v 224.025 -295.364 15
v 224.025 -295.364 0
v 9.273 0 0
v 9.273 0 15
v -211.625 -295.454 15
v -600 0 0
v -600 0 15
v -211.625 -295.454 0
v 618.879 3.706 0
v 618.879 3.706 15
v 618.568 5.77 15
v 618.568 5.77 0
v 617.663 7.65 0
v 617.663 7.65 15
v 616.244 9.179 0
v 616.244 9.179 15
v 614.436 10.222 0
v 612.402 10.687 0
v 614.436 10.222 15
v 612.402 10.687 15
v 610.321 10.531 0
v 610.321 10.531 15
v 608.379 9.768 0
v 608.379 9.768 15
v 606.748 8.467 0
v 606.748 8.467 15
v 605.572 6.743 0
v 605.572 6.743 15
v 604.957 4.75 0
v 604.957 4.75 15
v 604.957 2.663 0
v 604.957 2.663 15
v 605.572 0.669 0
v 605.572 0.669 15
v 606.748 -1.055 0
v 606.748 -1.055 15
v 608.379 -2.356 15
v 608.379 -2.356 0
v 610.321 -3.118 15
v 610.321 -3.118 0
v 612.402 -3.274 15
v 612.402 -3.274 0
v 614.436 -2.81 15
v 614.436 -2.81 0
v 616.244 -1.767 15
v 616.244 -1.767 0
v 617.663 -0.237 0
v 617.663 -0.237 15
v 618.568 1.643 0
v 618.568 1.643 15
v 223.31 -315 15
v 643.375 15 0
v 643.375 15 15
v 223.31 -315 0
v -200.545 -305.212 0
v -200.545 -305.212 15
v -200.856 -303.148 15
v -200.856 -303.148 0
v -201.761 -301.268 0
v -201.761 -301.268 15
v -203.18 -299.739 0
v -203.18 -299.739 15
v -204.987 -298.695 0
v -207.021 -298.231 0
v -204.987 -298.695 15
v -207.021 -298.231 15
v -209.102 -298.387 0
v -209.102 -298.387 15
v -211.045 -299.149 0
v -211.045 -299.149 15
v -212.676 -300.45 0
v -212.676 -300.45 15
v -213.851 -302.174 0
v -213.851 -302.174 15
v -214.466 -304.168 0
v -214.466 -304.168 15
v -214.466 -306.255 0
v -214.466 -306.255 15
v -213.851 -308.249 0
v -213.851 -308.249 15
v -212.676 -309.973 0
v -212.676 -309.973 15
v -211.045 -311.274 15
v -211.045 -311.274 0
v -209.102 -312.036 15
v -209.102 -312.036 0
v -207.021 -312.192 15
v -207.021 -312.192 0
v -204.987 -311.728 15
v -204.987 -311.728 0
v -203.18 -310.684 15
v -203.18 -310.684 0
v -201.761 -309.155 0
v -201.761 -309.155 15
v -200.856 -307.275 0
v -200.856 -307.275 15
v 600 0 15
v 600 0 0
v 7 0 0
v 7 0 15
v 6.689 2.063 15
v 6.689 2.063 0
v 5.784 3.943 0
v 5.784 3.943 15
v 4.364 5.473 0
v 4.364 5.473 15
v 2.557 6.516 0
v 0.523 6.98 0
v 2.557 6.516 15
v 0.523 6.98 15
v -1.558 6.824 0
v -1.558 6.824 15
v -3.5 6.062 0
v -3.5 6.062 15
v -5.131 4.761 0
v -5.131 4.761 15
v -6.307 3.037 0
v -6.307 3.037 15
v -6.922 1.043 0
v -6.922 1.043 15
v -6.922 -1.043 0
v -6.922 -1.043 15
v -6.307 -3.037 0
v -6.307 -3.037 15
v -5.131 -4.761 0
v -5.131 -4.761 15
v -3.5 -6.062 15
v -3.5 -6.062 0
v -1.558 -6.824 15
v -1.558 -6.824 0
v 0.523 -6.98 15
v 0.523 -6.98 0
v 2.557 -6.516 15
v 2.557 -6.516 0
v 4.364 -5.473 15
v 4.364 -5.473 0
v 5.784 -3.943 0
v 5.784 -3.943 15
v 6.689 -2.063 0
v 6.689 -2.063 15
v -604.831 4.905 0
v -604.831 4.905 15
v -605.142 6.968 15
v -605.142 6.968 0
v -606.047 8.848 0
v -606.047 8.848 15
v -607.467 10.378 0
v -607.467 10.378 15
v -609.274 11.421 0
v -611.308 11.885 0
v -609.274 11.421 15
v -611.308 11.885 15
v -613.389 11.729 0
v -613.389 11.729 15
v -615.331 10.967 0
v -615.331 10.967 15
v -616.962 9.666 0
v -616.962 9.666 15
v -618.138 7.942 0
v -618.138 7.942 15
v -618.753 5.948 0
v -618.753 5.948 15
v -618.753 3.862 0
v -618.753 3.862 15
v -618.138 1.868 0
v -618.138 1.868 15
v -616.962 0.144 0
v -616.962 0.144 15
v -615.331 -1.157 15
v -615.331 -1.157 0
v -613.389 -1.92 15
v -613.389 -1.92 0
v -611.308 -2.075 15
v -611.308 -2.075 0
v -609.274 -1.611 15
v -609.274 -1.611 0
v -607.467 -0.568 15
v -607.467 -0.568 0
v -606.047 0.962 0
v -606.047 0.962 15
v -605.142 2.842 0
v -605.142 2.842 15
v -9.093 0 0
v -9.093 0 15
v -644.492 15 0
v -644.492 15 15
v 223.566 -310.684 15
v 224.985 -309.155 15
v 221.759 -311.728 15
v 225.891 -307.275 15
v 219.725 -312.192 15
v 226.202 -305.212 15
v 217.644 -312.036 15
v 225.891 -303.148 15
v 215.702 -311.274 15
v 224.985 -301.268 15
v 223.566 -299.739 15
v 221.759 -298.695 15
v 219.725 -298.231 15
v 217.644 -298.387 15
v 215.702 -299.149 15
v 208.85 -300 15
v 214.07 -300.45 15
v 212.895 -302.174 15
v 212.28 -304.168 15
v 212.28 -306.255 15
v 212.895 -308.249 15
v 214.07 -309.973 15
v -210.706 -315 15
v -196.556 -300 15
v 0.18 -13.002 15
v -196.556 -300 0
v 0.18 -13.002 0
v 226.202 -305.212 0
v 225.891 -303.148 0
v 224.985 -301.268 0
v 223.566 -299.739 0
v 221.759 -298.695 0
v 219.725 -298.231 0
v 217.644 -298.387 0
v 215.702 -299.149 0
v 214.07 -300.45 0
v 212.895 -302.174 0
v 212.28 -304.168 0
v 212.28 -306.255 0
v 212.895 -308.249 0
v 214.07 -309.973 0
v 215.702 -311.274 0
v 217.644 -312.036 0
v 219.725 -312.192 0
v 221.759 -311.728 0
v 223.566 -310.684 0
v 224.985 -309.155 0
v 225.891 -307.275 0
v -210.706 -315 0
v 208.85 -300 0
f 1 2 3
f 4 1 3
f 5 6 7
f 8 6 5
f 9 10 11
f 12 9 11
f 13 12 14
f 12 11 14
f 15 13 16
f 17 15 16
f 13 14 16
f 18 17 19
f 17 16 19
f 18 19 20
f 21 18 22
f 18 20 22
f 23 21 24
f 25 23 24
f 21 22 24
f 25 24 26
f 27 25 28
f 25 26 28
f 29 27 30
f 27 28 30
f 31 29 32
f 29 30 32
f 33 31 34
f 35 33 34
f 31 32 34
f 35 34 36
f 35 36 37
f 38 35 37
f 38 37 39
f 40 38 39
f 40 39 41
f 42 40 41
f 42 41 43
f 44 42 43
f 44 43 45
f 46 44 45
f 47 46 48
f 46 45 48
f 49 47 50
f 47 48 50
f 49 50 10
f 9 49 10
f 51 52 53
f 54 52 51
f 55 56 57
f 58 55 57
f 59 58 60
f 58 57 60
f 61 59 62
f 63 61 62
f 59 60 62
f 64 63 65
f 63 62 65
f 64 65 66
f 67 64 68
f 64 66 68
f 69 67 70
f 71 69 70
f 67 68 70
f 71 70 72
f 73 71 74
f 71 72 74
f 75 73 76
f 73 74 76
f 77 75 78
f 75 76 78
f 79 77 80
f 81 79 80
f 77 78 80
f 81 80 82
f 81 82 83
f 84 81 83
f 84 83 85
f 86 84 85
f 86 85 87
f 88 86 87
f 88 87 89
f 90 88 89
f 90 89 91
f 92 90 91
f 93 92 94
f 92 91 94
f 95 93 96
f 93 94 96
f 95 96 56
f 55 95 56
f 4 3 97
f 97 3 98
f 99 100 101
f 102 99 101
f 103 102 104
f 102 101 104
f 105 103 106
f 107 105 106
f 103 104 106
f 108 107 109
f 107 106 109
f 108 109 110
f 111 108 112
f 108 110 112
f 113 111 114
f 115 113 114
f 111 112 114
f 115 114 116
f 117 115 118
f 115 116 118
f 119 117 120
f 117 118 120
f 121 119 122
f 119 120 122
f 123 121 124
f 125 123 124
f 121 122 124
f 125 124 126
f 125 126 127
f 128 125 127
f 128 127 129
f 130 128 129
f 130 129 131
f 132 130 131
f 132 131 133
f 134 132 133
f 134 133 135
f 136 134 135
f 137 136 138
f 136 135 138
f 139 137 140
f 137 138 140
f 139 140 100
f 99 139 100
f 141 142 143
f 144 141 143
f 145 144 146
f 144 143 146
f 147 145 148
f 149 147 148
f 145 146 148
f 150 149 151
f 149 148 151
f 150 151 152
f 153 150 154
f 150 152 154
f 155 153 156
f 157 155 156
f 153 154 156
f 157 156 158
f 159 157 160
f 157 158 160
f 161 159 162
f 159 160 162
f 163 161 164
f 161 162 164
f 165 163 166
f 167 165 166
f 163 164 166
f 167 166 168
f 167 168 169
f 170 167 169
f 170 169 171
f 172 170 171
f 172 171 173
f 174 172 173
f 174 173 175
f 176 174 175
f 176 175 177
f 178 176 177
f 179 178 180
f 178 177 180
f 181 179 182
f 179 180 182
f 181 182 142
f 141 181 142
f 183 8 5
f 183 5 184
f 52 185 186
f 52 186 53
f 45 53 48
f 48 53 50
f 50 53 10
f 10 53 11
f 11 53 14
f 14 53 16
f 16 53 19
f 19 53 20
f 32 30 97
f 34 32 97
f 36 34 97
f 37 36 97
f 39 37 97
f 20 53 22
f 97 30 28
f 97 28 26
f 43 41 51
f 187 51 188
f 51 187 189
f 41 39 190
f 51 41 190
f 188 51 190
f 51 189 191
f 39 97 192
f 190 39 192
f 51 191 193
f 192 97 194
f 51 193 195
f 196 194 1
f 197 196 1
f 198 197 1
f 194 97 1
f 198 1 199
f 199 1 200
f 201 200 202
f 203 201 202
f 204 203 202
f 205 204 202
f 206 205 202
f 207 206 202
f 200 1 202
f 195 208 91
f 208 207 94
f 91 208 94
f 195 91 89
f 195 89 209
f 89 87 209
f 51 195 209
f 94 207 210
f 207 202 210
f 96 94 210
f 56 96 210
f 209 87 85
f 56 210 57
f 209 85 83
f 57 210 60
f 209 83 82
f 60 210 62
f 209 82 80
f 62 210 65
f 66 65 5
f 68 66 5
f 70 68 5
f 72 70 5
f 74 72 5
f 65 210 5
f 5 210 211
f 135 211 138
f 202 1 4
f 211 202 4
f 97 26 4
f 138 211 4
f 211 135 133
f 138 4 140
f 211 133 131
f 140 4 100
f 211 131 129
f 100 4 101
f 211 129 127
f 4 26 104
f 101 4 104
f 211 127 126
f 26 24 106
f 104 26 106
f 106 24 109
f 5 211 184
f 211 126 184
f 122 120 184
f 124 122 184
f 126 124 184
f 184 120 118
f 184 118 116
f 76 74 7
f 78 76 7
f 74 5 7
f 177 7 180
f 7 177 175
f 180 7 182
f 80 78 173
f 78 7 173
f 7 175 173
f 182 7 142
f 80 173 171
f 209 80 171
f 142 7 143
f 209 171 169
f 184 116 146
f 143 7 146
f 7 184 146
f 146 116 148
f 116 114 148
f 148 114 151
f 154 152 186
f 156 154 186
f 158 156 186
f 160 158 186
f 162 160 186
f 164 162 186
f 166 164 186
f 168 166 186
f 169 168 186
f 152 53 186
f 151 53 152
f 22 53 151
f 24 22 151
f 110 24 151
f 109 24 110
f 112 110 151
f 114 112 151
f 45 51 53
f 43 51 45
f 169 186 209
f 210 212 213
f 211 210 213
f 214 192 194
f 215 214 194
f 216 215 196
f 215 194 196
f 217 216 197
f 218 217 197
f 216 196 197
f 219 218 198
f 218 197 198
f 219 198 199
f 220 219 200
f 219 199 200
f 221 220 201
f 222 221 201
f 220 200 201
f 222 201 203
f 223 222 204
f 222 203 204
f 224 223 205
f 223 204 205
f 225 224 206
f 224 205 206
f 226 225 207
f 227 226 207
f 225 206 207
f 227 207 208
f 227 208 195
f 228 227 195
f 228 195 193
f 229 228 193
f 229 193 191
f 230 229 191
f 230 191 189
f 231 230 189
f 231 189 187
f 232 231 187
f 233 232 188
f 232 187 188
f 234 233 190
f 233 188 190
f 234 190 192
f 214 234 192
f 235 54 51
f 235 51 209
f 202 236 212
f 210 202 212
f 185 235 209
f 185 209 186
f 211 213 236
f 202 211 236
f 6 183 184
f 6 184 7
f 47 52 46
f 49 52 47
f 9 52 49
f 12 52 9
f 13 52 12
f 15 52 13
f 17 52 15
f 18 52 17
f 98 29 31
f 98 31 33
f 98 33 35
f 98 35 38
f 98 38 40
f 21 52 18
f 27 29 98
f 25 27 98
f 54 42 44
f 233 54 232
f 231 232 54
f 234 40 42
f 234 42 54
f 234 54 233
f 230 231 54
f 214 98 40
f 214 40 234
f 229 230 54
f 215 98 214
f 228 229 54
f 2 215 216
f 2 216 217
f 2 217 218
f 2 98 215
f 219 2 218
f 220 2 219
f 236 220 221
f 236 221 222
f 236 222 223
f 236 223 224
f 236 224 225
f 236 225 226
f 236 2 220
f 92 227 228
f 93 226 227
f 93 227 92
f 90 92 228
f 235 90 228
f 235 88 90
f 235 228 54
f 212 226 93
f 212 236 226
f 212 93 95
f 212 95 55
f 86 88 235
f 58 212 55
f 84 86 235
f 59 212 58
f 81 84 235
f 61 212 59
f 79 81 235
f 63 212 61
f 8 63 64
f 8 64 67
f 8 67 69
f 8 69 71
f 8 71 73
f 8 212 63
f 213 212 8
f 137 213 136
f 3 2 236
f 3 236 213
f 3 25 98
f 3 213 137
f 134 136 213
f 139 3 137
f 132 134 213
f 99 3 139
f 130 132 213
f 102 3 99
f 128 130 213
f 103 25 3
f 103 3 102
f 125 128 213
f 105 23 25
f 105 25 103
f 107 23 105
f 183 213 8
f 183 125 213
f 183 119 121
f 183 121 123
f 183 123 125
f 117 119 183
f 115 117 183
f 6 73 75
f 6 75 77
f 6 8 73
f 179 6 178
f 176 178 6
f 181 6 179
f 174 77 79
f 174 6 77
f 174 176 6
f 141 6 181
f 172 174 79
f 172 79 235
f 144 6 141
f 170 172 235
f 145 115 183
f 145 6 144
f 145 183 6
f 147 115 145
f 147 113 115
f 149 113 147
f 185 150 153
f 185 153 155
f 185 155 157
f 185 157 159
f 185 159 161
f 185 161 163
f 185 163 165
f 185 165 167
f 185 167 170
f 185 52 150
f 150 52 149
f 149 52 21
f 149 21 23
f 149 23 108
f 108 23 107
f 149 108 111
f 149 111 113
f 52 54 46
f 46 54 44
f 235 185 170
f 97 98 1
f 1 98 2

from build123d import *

# Parameters (mm, degrees)
BOSS_EXTRUDE1_DEPTH = 15
SKETCH2_R           = 7
CUT_EXTRUDE2_DEPTH  = 15


with BuildPart() as part:
    # Sketch1 → Boss-Extrude1 (new body)
    with BuildSketch(Plane.XY):
        Polygon((-644.492210058, 15), (643.375012356, 15), (223.310378922, -315), (-210.705614848, -315), align=None)
        Polygon((9.272865978, 0), (600, 0), (224.024883315, -295.363567011), align=None, mode=Mode.SUBTRACT)
        Polygon((-9.092968645, 0), (-600, 0), (-211.624925428, -295.453515678), align=None, mode=Mode.SUBTRACT)
        Polygon((208.850194536, -300), (-196.555581164, -300), (0.180367696, -13.001697737), align=None, mode=Mode.SUBTRACT)
    extrude(amount=BOSS_EXTRUDE1_DEPTH)

    # Sketch2 → Cut-Extrude2 (cut)
    with BuildSketch(Plane.XY.offset(15)):
        with Locations((-611.831081684, 4.904990628)):
            Circle(SKETCH2_R)
        Circle(SKETCH2_R)
        with Locations((611.879096148, 3.706278654)):
            Circle(SKETCH2_R)
        with Locations((-207.544546049, -305.21160756)):
            Circle(SKETCH2_R)
        with Locations((219.201774513, -305.21160756)):
            Circle(SKETCH2_R)
    extrude(amount=-CUT_EXTRUDE2_DEPTH, mode=Mode.SUBTRACT)


solid = part.part
